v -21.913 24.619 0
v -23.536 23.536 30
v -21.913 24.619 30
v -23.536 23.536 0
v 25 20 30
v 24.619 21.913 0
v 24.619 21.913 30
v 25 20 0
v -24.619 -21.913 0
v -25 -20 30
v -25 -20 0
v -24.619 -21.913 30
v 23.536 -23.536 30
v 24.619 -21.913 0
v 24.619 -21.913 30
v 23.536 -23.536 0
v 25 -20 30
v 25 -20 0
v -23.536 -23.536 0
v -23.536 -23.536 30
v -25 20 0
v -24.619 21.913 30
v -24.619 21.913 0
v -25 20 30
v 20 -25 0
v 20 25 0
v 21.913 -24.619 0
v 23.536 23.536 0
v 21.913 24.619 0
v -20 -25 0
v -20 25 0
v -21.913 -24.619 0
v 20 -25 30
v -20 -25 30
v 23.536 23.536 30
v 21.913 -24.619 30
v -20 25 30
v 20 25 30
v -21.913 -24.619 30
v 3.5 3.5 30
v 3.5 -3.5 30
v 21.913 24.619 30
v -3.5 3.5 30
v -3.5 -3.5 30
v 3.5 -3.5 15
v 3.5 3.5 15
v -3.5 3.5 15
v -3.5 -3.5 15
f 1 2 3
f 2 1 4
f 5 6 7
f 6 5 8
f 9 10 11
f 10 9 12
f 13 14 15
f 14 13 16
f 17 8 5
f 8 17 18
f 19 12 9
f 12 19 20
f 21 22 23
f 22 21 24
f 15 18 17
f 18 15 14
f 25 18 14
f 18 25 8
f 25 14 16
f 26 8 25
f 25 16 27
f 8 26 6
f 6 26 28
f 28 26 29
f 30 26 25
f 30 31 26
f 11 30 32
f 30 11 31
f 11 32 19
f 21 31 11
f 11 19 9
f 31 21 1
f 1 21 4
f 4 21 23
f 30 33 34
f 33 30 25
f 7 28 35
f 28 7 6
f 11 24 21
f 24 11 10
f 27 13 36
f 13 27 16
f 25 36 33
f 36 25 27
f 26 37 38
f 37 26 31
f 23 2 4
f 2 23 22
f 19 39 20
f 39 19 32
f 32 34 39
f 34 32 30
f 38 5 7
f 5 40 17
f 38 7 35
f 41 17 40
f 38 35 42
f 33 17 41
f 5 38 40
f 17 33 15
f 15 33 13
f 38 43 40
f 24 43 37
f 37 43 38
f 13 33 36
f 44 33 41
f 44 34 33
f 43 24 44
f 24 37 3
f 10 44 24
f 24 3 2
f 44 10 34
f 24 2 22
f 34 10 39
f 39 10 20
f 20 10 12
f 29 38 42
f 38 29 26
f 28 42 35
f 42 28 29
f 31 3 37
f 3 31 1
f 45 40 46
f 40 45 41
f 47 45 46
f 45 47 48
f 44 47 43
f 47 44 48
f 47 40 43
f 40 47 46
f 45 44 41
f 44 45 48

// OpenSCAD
// file: rounded-box.scad
use_minkowski = true;
cylinder_faces = 100;

%rounded_box(10,10,10, 2);
cylinder(r = 2, h = 1);

module rounded_box(length, width, height, r) {

    if (use_minkowski) {
        
        minkowski() {

            cylinder(r = r, h = 1);

            cube(size=[ length - (r * 2.0),
                        width - (r * 2.0),
                        height - 1 ], center = false);

        }
        
    } else {
        
        hull() {
            translate([r,r,0]) cylinder(r = r, h = height, $fn = cylinder_faces);
            translate([length-r,r,0]) cylinder(r = r, h = height, $fn = cylinder_faces);
            translate([length-r,width-r,0]) cylinder(r = r, h = height, $fn = cylinder_faces);
            translate([r,width-r,0]) cylinder(r = r, h = height, $fn = cylinder_faces);
        }
    }

}
// main file
use <rounded-box.scad>;

extrusion = 40;   // 40mm x 40mm
tolerance =  0.75; // 0.5mm in each direction

if (1) {
    foot(extrusion + 10.0, extrusion + 10.0, extrusion - 10);
}

module foot(l, w, h) {

corner_radius = 5.0;
scale_factor = (extrusion + 2.0 * tolerance) / extrusion;


    difference() {
        translate([-(l / 2.0 - corner_radius), -(w / 2.0 - corner_radius), 0]) rounded_box(l, w, h, corner_radius);

        scale([scale_factor, scale_factor, 1]) translate([-extrusion / 2.0, -extrusion / 2.0, h / 2.0]) 
        linear_extrude(height = h / 2.0 + 1.0) import("kjn/extrusion.dxf");
        translate([0, 0, 3.0 * h / 4.0 + 1.0 / 2.0]) cube([7.0, 7.0, h / 2.0 + 1.0], center = true);
    }

}
